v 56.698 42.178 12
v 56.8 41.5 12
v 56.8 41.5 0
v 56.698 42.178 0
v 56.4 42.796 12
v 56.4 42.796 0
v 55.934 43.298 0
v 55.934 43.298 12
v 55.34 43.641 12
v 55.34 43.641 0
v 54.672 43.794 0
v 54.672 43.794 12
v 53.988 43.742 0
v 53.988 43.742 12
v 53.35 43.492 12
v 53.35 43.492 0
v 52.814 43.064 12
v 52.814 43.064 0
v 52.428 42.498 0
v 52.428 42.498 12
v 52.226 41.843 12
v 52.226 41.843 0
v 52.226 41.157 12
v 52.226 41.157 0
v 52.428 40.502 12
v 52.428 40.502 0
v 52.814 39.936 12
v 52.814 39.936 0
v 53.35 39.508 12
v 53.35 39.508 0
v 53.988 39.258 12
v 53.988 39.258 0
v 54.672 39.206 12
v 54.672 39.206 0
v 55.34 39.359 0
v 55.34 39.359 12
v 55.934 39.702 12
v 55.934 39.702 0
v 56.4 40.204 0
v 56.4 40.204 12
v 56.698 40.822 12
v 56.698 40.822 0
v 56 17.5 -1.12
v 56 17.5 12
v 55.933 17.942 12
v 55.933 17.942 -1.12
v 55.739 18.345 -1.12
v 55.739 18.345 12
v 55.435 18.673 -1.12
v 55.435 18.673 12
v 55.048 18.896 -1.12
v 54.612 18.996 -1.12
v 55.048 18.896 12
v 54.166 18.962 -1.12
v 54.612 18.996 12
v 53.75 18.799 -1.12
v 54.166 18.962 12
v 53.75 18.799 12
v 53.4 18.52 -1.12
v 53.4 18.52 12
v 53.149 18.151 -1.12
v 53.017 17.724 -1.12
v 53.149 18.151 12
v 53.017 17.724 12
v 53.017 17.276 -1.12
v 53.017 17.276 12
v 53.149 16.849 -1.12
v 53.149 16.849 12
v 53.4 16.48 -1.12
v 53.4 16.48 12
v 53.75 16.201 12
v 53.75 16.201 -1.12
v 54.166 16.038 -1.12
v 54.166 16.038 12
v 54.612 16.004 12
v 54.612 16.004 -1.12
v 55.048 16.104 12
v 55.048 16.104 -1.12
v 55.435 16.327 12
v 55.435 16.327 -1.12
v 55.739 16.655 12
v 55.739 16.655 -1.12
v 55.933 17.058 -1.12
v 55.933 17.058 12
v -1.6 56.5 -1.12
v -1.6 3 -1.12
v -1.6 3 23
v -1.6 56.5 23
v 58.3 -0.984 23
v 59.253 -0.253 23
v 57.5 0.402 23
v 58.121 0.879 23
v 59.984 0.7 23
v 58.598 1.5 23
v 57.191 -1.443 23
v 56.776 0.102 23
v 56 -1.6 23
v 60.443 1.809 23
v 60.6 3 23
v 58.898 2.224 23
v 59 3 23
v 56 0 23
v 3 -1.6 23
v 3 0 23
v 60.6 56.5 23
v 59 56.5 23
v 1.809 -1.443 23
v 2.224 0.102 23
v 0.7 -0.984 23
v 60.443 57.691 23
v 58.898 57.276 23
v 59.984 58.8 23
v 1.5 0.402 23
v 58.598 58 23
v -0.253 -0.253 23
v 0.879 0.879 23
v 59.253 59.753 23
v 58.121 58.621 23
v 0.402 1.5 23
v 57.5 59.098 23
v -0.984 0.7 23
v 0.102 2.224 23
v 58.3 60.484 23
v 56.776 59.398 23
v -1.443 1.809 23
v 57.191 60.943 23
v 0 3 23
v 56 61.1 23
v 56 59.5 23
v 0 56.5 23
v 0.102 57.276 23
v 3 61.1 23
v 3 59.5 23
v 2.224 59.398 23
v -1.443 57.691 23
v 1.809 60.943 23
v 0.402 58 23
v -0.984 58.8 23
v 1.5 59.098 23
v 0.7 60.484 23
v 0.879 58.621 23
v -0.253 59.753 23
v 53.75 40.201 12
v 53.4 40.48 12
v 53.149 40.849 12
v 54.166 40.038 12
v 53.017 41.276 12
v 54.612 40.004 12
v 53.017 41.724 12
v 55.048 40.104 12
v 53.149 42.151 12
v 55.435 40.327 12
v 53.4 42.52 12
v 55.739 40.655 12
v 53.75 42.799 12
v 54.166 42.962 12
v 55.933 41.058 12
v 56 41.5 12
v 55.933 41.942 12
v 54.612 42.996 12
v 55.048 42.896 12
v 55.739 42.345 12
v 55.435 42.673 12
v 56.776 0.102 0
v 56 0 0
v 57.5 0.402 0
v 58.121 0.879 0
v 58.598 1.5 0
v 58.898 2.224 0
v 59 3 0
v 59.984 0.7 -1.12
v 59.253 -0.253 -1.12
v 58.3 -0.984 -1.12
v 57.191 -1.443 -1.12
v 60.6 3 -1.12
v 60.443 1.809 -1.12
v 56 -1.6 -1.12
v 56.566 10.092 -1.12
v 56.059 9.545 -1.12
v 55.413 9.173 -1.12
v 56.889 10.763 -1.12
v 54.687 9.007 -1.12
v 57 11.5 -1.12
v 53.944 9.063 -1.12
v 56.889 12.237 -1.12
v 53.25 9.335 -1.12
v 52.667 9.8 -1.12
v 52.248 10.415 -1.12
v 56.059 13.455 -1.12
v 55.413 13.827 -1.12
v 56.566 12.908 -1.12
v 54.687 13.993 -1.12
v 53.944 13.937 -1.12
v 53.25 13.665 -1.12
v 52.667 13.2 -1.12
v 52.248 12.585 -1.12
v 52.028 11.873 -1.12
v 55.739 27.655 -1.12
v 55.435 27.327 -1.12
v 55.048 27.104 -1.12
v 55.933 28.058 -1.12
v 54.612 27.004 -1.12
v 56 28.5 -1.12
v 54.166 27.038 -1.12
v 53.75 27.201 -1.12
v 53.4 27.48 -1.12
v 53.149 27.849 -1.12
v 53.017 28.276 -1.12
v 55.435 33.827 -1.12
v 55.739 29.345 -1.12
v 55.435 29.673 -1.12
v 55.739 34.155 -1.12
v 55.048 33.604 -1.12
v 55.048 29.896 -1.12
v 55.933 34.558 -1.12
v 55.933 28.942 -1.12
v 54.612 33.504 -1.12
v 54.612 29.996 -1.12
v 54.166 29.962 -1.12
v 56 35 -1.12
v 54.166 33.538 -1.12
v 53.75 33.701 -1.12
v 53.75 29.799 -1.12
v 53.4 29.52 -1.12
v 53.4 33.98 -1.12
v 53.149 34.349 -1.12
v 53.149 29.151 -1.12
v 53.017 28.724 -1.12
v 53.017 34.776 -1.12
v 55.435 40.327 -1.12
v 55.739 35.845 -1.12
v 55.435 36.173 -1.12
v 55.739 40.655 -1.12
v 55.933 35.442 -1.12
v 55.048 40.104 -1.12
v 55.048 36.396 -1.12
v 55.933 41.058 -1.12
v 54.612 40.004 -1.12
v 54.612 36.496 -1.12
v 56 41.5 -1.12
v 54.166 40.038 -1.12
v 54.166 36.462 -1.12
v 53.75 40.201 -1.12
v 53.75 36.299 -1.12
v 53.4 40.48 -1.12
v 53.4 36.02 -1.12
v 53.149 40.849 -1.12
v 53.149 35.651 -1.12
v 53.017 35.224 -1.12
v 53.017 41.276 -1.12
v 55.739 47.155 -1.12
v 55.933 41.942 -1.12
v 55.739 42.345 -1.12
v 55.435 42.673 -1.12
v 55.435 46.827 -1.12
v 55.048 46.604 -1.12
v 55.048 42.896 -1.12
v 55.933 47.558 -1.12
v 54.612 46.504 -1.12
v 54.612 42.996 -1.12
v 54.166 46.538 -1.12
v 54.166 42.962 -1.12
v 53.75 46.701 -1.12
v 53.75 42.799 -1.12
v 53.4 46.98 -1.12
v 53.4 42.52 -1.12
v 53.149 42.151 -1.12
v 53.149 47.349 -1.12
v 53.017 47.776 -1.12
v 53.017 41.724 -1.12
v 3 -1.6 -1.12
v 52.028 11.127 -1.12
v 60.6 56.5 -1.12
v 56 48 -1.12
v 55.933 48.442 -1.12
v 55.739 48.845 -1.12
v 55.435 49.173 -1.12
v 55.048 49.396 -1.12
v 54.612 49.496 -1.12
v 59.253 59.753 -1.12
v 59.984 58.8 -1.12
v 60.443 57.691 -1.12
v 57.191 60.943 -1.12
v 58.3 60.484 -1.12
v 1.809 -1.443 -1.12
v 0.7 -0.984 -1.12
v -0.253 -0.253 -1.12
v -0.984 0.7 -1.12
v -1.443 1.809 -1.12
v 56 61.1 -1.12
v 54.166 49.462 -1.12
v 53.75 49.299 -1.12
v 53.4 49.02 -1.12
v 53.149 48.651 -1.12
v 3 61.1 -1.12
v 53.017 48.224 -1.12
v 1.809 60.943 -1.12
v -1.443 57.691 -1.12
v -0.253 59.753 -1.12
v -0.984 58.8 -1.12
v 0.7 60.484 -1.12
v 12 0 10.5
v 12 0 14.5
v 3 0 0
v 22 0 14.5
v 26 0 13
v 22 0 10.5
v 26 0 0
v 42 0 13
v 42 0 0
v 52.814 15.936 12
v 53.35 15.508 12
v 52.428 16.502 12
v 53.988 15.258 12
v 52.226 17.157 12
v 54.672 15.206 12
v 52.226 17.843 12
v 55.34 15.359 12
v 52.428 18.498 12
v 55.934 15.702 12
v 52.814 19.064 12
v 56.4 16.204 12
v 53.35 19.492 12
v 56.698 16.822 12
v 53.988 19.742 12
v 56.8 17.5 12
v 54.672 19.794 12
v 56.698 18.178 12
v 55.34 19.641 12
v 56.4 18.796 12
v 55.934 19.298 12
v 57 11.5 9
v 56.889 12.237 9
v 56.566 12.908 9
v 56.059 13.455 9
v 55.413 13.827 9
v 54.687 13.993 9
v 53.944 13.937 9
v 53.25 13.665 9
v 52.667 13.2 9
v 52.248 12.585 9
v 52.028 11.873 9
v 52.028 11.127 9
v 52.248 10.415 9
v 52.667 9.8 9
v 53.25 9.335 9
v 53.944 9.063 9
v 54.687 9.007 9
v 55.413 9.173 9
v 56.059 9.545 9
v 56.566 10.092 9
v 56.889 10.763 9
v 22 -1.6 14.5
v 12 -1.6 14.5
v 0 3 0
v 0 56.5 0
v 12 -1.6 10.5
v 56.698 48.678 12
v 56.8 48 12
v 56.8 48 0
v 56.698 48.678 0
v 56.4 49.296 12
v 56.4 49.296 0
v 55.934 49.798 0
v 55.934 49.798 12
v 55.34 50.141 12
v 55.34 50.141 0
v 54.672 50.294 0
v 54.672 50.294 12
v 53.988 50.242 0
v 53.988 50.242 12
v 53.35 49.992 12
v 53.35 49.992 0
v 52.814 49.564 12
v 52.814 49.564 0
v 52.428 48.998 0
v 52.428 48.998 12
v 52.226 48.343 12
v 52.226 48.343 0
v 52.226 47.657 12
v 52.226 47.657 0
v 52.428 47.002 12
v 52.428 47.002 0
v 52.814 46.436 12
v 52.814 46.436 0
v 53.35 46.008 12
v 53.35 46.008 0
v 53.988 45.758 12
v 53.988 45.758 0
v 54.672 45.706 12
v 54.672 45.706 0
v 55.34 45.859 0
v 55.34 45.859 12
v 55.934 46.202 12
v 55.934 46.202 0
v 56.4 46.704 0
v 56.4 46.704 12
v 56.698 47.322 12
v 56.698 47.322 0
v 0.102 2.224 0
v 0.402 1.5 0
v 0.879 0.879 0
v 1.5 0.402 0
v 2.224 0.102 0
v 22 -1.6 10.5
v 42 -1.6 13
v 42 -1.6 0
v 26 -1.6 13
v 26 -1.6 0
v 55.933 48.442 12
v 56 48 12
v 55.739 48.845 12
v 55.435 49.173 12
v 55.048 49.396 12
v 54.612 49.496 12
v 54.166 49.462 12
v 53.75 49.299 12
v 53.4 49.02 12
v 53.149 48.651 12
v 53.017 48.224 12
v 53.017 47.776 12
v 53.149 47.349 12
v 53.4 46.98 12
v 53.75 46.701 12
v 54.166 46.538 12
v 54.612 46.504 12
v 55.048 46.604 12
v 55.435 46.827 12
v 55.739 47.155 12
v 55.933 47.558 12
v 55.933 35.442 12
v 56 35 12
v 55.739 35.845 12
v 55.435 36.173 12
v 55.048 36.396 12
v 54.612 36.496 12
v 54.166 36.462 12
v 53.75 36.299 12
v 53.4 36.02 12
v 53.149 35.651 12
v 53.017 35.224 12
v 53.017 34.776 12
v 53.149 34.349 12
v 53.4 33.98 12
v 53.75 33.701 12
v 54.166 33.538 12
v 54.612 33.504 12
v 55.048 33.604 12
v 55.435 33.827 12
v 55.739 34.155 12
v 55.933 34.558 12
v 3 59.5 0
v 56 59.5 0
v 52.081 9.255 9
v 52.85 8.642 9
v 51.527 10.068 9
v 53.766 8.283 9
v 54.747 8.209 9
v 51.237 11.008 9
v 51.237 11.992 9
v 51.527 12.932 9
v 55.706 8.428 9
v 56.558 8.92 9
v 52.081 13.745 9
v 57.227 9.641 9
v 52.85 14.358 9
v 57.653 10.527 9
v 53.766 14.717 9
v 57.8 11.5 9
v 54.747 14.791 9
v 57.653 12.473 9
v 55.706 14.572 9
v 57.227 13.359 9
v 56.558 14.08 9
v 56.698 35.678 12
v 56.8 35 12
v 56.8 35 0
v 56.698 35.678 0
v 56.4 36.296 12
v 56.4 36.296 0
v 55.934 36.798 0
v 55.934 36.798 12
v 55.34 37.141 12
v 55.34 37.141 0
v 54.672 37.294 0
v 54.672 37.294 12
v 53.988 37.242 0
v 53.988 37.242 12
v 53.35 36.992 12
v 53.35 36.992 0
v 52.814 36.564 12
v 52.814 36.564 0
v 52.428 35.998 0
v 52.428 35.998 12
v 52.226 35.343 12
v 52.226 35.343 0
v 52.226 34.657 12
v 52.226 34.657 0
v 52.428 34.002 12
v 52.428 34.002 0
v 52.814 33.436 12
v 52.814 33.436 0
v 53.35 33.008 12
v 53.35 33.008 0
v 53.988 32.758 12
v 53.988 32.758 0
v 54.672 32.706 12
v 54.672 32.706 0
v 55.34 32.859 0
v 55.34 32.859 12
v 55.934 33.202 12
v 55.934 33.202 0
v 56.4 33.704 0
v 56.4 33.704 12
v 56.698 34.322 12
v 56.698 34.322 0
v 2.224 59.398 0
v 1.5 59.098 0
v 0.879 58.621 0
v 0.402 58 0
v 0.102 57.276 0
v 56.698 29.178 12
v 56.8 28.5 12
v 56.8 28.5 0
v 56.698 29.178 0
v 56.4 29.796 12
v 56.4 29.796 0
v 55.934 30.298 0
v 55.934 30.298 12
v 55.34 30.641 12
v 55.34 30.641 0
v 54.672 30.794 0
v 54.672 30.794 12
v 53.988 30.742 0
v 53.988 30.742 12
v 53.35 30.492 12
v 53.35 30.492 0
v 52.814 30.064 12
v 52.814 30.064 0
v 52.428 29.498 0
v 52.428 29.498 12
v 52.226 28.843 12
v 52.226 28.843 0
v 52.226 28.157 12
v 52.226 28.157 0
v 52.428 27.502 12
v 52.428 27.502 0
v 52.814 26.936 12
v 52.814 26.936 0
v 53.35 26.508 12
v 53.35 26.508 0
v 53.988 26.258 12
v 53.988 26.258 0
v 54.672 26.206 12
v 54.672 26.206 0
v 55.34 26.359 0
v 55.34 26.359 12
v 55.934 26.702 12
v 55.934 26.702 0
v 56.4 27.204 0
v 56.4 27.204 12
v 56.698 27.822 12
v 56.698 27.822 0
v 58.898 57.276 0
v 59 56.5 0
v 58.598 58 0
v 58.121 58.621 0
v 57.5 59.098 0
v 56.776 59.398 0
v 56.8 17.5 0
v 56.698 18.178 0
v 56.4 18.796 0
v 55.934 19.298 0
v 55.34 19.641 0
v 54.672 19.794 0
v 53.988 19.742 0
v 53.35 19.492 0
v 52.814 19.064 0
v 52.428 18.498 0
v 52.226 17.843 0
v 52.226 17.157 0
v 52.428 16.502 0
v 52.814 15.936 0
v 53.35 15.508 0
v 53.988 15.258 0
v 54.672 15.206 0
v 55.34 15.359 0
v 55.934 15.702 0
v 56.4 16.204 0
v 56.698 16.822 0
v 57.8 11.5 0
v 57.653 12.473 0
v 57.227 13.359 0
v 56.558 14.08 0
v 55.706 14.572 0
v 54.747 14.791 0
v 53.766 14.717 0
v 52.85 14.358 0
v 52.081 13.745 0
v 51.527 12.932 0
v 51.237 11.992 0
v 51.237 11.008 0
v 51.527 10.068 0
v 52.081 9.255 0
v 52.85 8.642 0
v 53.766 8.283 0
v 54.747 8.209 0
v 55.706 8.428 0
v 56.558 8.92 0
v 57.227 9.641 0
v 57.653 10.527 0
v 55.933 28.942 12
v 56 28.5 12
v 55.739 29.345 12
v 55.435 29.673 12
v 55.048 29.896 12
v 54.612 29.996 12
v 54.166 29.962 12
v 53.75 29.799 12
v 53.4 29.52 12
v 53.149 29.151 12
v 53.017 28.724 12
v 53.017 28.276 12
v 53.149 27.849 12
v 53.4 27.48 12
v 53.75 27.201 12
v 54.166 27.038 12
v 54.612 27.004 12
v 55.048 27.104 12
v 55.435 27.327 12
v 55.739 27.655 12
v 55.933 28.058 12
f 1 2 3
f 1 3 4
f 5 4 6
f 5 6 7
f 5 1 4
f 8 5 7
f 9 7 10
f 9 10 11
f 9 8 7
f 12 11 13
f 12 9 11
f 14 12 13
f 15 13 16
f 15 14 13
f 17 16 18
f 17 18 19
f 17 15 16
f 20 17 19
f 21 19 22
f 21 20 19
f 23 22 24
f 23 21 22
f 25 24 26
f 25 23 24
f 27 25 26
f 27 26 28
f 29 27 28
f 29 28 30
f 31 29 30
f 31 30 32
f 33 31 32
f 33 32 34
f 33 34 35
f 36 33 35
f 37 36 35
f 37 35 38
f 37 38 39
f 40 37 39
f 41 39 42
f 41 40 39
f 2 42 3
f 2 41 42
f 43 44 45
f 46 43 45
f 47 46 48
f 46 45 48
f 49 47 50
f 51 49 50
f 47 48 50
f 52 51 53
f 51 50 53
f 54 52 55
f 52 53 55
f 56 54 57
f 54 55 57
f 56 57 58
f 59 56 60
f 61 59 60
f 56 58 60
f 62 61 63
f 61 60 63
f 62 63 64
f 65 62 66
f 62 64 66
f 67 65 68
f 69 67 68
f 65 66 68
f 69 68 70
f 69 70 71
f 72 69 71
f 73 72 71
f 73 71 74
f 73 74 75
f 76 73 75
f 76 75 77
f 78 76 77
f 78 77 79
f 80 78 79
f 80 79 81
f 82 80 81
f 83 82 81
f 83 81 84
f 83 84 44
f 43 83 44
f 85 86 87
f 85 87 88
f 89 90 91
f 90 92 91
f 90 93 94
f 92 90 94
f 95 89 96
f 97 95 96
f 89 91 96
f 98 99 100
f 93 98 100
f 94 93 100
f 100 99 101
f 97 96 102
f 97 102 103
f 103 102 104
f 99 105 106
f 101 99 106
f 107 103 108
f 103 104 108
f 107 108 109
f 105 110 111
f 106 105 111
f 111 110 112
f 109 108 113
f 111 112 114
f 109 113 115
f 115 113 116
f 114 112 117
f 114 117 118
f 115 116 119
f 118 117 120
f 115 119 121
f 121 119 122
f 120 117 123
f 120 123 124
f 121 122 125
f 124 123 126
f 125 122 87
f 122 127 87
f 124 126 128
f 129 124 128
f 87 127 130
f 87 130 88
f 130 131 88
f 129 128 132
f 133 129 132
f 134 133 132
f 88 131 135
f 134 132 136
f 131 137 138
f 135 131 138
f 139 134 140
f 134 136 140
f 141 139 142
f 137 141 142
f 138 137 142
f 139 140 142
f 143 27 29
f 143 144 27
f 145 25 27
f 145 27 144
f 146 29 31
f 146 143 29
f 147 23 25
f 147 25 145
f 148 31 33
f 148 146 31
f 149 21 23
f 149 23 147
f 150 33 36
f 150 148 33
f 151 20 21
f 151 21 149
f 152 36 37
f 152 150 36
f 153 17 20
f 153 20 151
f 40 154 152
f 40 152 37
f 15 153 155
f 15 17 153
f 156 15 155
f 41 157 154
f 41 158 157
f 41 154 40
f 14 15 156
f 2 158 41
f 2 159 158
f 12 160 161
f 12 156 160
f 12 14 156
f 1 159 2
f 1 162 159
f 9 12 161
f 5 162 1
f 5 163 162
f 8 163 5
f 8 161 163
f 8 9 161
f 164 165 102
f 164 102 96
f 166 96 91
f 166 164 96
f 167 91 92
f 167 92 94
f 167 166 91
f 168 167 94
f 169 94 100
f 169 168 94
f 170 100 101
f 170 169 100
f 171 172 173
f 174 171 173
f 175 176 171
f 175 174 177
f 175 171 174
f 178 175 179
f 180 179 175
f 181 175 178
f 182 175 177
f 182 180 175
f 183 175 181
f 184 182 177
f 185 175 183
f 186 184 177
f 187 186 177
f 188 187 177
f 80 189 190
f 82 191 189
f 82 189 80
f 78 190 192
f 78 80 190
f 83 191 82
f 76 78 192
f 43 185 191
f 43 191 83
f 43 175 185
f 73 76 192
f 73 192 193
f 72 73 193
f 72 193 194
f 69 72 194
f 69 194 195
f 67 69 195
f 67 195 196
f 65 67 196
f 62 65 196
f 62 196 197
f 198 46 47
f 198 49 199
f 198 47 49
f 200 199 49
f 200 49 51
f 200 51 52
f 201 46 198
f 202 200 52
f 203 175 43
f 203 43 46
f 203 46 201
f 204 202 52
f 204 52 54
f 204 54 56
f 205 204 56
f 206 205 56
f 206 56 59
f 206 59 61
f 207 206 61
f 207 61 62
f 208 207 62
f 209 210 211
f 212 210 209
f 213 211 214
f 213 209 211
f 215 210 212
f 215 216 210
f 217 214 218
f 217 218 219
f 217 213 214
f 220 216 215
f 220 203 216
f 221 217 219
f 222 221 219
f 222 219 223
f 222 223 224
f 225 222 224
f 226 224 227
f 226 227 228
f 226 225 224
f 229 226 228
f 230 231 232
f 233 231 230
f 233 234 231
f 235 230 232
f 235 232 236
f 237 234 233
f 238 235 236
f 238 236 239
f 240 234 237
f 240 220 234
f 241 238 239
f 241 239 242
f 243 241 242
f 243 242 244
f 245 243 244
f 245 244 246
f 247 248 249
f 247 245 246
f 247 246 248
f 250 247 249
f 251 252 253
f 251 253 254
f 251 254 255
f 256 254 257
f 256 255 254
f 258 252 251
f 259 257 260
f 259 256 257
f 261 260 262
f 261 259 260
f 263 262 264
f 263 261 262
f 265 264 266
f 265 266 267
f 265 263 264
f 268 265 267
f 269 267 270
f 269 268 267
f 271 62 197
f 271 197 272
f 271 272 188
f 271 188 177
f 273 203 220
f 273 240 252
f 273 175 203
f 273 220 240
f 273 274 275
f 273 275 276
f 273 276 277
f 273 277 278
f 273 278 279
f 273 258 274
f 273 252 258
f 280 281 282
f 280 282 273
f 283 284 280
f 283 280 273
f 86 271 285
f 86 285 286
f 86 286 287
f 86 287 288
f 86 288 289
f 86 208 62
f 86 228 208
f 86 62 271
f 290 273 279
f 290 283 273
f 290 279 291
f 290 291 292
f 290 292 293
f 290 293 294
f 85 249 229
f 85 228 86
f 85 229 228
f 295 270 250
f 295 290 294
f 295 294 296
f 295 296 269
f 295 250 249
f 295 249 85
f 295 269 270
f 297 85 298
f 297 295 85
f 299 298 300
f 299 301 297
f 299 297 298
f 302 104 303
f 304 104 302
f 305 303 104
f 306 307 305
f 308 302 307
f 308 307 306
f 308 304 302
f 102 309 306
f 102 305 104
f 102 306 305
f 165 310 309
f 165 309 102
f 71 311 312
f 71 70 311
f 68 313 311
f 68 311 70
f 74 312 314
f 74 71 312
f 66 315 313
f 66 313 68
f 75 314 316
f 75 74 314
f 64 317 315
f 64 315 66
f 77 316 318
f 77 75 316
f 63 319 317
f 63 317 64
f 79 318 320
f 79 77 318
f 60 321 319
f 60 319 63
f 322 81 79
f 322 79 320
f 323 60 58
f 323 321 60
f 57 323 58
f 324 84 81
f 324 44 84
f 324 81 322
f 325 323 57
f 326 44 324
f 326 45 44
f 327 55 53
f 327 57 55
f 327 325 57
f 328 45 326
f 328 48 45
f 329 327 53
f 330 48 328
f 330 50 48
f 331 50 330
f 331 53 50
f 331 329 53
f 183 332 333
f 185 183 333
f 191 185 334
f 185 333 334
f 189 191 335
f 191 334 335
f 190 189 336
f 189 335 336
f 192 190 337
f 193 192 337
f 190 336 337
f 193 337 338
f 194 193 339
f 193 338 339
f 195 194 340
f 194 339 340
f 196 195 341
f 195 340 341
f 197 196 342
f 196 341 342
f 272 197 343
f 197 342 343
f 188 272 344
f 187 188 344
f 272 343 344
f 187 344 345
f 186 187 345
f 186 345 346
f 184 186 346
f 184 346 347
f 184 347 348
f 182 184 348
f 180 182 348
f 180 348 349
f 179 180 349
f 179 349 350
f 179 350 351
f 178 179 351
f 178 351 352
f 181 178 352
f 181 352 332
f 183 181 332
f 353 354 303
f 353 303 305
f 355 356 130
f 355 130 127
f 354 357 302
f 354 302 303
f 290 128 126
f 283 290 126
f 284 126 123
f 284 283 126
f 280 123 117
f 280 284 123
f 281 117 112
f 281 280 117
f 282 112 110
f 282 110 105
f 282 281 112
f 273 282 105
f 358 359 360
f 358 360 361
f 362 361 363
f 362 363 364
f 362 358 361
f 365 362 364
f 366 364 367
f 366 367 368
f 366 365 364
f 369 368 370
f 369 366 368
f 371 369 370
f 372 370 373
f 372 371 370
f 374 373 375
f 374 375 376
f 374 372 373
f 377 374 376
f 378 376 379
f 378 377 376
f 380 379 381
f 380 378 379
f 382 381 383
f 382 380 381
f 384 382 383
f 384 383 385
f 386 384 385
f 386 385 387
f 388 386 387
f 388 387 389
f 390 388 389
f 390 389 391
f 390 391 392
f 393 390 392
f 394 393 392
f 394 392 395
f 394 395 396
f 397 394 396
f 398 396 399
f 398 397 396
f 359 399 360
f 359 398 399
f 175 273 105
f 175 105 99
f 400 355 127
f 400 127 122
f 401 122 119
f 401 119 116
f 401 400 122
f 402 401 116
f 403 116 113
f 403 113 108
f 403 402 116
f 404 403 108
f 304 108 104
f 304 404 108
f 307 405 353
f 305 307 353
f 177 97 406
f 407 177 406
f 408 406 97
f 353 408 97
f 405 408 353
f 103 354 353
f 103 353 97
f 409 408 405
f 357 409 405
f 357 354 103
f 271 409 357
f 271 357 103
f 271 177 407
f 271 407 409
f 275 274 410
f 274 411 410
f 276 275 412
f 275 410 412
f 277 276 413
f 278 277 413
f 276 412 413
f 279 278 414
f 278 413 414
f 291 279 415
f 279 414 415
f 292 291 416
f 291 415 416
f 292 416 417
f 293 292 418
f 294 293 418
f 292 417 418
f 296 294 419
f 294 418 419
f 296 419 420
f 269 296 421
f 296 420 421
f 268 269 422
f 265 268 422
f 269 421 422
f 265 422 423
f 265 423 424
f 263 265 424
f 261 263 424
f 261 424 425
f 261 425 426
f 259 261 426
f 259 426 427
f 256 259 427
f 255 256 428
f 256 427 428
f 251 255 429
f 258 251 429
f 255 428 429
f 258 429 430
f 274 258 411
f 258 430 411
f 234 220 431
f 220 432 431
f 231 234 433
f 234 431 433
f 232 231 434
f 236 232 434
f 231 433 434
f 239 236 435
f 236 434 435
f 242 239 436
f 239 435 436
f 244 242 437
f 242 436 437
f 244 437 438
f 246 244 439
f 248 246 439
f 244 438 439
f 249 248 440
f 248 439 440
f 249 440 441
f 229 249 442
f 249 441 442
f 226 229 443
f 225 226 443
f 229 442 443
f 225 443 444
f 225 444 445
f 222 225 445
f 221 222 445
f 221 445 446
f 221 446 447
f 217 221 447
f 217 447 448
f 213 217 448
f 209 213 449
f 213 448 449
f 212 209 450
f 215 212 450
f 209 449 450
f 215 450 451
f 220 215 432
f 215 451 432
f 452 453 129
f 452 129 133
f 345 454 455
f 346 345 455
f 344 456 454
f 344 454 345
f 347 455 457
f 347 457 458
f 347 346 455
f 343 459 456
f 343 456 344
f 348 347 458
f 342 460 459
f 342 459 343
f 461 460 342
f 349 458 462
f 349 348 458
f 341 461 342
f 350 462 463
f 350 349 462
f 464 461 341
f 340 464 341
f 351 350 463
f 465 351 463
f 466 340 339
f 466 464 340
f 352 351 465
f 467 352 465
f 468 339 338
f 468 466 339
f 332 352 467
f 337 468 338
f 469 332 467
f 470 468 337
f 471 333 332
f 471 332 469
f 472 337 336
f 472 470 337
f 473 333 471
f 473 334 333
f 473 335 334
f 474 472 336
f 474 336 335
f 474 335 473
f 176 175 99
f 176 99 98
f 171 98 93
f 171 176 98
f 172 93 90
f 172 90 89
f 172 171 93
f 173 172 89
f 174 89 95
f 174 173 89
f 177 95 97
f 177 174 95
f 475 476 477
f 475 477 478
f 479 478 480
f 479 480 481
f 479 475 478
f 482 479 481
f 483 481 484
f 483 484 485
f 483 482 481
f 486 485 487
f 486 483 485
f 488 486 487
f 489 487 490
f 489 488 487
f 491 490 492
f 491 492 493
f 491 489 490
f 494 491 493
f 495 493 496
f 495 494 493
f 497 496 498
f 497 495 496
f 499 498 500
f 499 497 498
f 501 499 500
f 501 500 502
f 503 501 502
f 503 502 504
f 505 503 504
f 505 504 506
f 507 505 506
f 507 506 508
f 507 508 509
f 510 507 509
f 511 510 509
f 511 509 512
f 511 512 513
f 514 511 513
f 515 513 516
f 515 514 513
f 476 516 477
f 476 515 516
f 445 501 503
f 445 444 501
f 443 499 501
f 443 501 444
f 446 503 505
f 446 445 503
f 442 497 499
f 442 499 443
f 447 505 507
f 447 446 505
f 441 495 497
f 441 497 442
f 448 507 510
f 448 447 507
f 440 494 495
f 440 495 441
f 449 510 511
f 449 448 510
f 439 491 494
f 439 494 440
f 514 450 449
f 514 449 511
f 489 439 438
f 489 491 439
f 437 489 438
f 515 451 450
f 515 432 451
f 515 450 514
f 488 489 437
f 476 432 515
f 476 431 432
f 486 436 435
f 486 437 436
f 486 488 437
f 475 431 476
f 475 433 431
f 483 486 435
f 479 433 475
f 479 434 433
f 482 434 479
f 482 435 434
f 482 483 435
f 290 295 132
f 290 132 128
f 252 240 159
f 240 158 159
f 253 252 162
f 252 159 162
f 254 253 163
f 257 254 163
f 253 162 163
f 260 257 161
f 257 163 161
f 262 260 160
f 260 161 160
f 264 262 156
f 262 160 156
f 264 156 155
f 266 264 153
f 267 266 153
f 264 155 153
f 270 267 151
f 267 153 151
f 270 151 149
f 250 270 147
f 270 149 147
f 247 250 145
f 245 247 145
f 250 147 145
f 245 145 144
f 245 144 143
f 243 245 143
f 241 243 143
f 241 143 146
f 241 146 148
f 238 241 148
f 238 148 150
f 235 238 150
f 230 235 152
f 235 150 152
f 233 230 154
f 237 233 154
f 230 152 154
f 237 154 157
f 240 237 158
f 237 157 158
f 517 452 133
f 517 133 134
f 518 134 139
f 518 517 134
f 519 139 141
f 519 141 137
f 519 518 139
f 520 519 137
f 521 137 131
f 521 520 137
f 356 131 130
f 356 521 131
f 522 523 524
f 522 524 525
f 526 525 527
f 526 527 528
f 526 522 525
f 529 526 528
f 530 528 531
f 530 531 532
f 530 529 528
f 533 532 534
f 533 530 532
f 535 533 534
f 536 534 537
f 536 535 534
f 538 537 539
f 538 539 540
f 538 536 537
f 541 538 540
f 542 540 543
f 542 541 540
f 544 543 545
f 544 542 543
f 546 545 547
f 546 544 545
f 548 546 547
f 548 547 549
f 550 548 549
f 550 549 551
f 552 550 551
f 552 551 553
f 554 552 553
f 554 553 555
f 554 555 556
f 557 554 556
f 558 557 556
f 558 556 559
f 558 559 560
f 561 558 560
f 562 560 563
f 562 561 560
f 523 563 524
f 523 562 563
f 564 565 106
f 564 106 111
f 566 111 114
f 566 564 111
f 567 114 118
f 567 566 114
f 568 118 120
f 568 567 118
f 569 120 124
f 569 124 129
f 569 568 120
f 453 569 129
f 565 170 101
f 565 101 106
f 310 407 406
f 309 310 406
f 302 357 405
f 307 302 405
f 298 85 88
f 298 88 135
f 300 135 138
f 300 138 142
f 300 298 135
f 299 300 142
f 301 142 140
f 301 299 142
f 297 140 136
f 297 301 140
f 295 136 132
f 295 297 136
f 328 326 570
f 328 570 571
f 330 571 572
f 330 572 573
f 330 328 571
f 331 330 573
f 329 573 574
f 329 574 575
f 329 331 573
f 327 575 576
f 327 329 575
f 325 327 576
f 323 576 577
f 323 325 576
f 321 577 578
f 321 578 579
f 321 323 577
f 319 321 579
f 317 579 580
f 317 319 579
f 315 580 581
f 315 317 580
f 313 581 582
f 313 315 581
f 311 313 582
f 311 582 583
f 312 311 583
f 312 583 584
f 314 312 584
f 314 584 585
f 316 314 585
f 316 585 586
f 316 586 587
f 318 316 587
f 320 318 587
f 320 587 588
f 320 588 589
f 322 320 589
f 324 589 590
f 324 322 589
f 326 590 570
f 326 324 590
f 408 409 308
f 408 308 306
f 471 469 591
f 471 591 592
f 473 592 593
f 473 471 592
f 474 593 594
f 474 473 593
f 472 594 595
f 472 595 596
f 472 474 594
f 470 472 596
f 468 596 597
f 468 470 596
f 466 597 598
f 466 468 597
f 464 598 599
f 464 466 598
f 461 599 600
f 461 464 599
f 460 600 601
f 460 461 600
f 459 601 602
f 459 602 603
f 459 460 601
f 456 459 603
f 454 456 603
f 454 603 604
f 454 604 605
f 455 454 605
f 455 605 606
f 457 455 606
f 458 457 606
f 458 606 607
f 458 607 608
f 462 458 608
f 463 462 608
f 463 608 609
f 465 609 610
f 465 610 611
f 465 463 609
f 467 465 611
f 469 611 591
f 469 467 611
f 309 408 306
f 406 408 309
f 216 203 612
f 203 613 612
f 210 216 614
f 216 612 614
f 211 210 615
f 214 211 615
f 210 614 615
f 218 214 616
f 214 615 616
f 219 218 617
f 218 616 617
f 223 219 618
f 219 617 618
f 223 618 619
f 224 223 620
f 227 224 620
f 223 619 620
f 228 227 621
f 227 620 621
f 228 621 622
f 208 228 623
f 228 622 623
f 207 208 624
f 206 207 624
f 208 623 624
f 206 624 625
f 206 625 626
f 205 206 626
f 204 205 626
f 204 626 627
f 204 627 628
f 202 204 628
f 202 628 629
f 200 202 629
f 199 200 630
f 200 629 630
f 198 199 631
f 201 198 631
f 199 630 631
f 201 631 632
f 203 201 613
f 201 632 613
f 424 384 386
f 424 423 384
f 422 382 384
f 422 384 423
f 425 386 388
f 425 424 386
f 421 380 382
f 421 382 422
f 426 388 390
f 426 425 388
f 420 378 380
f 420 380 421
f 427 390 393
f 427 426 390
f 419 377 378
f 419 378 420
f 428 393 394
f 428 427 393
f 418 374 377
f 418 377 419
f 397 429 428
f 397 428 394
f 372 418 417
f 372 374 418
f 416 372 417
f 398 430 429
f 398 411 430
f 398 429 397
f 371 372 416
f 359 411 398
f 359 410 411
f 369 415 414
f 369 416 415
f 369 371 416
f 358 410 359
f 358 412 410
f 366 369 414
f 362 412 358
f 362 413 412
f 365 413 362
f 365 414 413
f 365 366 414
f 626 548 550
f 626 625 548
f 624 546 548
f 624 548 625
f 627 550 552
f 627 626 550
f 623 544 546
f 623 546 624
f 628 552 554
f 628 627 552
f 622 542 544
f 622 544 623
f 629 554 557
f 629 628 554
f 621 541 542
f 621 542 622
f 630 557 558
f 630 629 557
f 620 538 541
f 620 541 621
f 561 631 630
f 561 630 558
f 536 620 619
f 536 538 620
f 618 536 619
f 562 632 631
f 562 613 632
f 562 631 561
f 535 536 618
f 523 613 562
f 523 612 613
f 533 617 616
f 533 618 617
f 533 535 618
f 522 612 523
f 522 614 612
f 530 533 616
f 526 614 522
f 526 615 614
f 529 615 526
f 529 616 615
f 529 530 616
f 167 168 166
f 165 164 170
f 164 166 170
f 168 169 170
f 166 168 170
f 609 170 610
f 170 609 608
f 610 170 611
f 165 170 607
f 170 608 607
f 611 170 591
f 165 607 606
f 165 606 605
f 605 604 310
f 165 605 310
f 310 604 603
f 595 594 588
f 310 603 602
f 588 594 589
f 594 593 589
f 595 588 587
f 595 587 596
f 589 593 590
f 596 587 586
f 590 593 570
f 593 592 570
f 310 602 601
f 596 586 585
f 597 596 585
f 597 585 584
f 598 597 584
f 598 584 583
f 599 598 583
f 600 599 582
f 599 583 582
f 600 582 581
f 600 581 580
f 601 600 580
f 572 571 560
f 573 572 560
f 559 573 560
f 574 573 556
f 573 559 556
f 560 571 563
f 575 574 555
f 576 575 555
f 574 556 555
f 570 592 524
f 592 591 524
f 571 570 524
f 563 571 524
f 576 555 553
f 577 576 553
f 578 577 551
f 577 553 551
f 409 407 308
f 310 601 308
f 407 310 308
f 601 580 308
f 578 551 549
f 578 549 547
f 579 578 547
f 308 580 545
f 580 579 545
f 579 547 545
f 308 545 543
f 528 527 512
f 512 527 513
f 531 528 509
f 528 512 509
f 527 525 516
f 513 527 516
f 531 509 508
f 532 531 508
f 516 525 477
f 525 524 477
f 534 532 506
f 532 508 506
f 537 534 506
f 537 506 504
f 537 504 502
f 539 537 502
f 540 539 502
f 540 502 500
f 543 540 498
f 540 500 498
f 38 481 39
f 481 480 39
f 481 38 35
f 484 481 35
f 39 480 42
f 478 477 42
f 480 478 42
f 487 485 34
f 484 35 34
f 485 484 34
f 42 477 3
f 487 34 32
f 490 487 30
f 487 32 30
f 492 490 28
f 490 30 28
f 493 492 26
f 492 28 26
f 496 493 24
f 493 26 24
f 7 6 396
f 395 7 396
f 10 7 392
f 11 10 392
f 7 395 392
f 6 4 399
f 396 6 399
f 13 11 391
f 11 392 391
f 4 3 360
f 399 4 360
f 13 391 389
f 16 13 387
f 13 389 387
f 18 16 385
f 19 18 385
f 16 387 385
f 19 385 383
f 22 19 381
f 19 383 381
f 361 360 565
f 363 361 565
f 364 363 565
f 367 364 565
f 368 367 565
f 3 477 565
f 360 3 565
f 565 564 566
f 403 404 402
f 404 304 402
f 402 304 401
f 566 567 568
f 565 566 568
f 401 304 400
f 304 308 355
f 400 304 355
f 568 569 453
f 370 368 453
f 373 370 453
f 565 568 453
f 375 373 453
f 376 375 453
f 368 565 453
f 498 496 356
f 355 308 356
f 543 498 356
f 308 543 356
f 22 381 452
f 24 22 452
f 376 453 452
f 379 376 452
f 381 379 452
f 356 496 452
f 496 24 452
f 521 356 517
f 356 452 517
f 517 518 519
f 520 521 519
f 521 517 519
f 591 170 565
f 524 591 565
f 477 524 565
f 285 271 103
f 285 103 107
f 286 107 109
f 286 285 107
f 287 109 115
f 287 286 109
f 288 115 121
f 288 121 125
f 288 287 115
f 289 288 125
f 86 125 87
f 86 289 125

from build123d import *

# Parameters (mm, degrees)
PARED_DEPTH             = 23
CONECTORES_REACH        = 92.181
CROQUIS2_W              = 16
CROQUIS2_H              = 13
CROQUIS2_W_2            = 10
CROQUIS2_H_2            = 4
BASE_START              = -1.12
BASE_FRENTE_DEPTH       = 1.12
LUCES_REACH             = 91.076
CROQUIS3_R              = 1.5
CROQUIS3_R_2            = 2.5
SALIENTE_EXTRUIR1_START = 12
CROQUIS3_3_R            = 2.3
CROQUIS3_3_R_2          = 1.5
SALIENTE_EXTRUIR1_DEPTH = 12
SALIENTE_EXTRUIR2_START = 9
CROQUIS3_4_R            = 3.3
CROQUIS3_4_R_2          = 2.5
SALIENTE_EXTRUIR2_DEPTH = 9


with BuildPart() as part:
    # Croquis1 → pared (new body)
    with BuildSketch(Plane.XY):
        with BuildLine():
            Line((3, 61.1), (56, 61.1))
            ThreePointArc((56, 61.1), (59.252691193, 59.752691193), (60.6, 56.5))
            Line((60.6, 56.5), (60.6, 3))
            ThreePointArc((60.6, 3), (59.252691193, -0.252691193), (56, -1.6))
            Line((56, -1.6), (3, -1.6))
            ThreePointArc((3, -1.6), (-0.252691193, -0.252691193), (-1.6, 3))
            Line((-1.6, 3), (-1.6, 56.5))
            ThreePointArc((-1.6, 56.5), (-0.252691193, 59.752691193), (3, 61.1))
        make_face()
        with BuildLine():
            Line((3, 0), (56, 0))
            ThreePointArc((56, 0), (58.121320344, 0.878679656), (59, 3))
            Line((59, 3), (59, 56.5))
            ThreePointArc((59, 56.5), (58.121320344, 58.621320344), (56, 59.5))
            Line((56, 59.5), (3, 59.5))
            ThreePointArc((3, 59.5), (0.878679656, 58.621320344), (0, 56.5))
            Line((0, 56.5), (0, 3))
            ThreePointArc((0, 3), (0.878679656, 0.878679656), (3, 0))
        make_face(mode=Mode.SUBTRACT)
    extrude(amount=PARED_DEPTH)

    # Croquis2 → conectores (cut, up to next)
    with BuildSketch(Plane.XZ.offset(1.6), mode=Mode.PRIVATE) as conectores_sk1:
        with Locations((34, 6.5)):
            Rectangle(CROQUIS2_W, CROQUIS2_H)
    conectores_tool1 = extrude(conectores_sk1.sketch, amount=-CONECTORES_REACH, mode=Mode.PRIVATE) & part.part
    # Croquis2 → conectores (cut, up to next)
    with BuildSketch(Plane.XZ.offset(1.6), mode=Mode.PRIVATE) as conectores_sk2:
        with Locations((17, 12.5)):
            Rectangle(CROQUIS2_W_2, CROQUIS2_H_2)
    conectores_tool2 = extrude(conectores_sk2.sketch, amount=-CONECTORES_REACH, mode=Mode.PRIVATE) & part.part
    add(conectores_tool1.solids().sort_by_distance((34, -1.6, 6.5))[0], mode=Mode.SUBTRACT)
    add(conectores_tool2.solids().sort_by_distance((17, -1.6, 12.5))[0], mode=Mode.SUBTRACT)

    # Croquis1<2> → base frente (add)
    with BuildSketch(Plane.XY.offset(BASE_START)):
        with BuildLine():
            Line((3, 61.1), (56, 61.1))
            ThreePointArc((56, 61.1), (59.252691193, 59.752691193), (60.6, 56.5))
            Line((60.6, 56.5), (60.6, 3))
            ThreePointArc((60.6, 3), (59.252691193, -0.252691193), (56, -1.6))
            Line((56, -1.6), (3, -1.6))
            ThreePointArc((3, -1.6), (-0.252691193, -0.252691193), (-1.6, 3))
            Line((-1.6, 3), (-1.6, 56.5))
            ThreePointArc((-1.6, 56.5), (-0.252691193, 59.752691193), (3, 61.1))
        make_face()
    extrude(amount=BASE_FRENTE_DEPTH)

    # Croquis3 → luces (cut, up to next)
    with BuildSketch(Plane.XY, mode=Mode.PRIVATE) as luces_sk1:
        with Locations((54.5, 48)):
            Circle(CROQUIS3_R)
    luces_tool1 = extrude(luces_sk1.sketch, amount=-LUCES_REACH, mode=Mode.PRIVATE) & part.part
    # Croquis3 → luces (cut, up to next)
    with BuildSketch(Plane.XY, mode=Mode.PRIVATE) as luces_sk2:
        with Locations((54.5, 41.5)):
            Circle(CROQUIS3_R)
    luces_tool2 = extrude(luces_sk2.sketch, amount=-LUCES_REACH, mode=Mode.PRIVATE) & part.part
    # Croquis3 → luces (cut, up to next)
    with BuildSketch(Plane.XY, mode=Mode.PRIVATE) as luces_sk3:
        with Locations((54.5, 35)):
            Circle(CROQUIS3_R)
    luces_tool3 = extrude(luces_sk3.sketch, amount=-LUCES_REACH, mode=Mode.PRIVATE) & part.part
    # Croquis3 → luces (cut, up to next)
    with BuildSketch(Plane.XY, mode=Mode.PRIVATE) as luces_sk4:
        with Locations((54.5, 28.5)):
            Circle(CROQUIS3_R)
    luces_tool4 = extrude(luces_sk4.sketch, amount=-LUCES_REACH, mode=Mode.PRIVATE) & part.part
    # Croquis3 → luces (cut, up to next)
    with BuildSketch(Plane.XY, mode=Mode.PRIVATE) as luces_sk5:
        with Locations((54.5, 17.5)):
            Circle(CROQUIS3_R)
    luces_tool5 = extrude(luces_sk5.sketch, amount=-LUCES_REACH, mode=Mode.PRIVATE) & part.part
    # Croquis3 → luces (cut, up to next)
    with BuildSketch(Plane.XY, mode=Mode.PRIVATE) as luces_sk6:
        with Locations((54.5, 11.5)):
            Circle(CROQUIS3_R_2)
    luces_tool6 = extrude(luces_sk6.sketch, amount=-LUCES_REACH, mode=Mode.PRIVATE) & part.part
    add(luces_tool1.solids().sort_by_distance((54.5, 48, 0))[0], mode=Mode.SUBTRACT)
    add(luces_tool2.solids().sort_by_distance((54.5, 41.5, 0))[0], mode=Mode.SUBTRACT)
    add(luces_tool3.solids().sort_by_distance((54.5, 35, 0))[0], mode=Mode.SUBTRACT)
    add(luces_tool4.solids().sort_by_distance((54.5, 28.5, 0))[0], mode=Mode.SUBTRACT)
    add(luces_tool5.solids().sort_by_distance((54.5, 17.5, 0))[0], mode=Mode.SUBTRACT)
    add(luces_tool6.solids().sort_by_distance((54.5, 11.5, 0))[0], mode=Mode.SUBTRACT)

    # Croquis3<3> → Saliente-Extruir1 (add)
    # profile 1 of 5: a face of its own
    with BuildSketch(Plane.XY.offset(SALIENTE_EXTRUIR1_START)):
        with Locations((54.5, 17.5)):
            Circle(CROQUIS3_3_R)
        with Locations((54.5, 17.5)):
            Circle(CROQUIS3_3_R_2, mode=Mode.SUBTRACT)
    # profile 2 of 5: a face of its own
    with BuildSketch(Plane.XY.offset(SALIENTE_EXTRUIR1_START)):
        with Locations((54.5, 28.5)):
            Circle(CROQUIS3_3_R)
        with Locations((54.5, 28.5)):
            Circle(CROQUIS3_3_R_2, mode=Mode.SUBTRACT)
    # profile 3 of 5: a face of its own
    with BuildSketch(Plane.XY.offset(SALIENTE_EXTRUIR1_START)):
        with Locations((54.5, 35)):
            Circle(CROQUIS3_3_R)
        with Locations((54.5, 35)):
            Circle(CROQUIS3_3_R_2, mode=Mode.SUBTRACT)
    # profile 4 of 5: a face of its own
    with BuildSketch(Plane.XY.offset(SALIENTE_EXTRUIR1_START)):
        with Locations((54.5, 41.5)):
            Circle(CROQUIS3_3_R)
        with Locations((54.5, 41.5)):
            Circle(CROQUIS3_3_R_2, mode=Mode.SUBTRACT)
    # profile 5 of 5: a face of its own
    with BuildSketch(Plane.XY.offset(SALIENTE_EXTRUIR1_START)):
        with Locations((54.5, 48)):
            Circle(CROQUIS3_3_R)
        with Locations((54.5, 48)):
            Circle(CROQUIS3_3_R_2, mode=Mode.SUBTRACT)
    extrude(amount=-SALIENTE_EXTRUIR1_DEPTH)

    # Croquis3<4> → Saliente-Extruir2 (add)
    with BuildSketch(Plane.XY.offset(SALIENTE_EXTRUIR2_START)):
        with Locations((54.5, 11.5)):
            Circle(CROQUIS3_4_R)
        with Locations((54.5, 11.5)):
            Circle(CROQUIS3_4_R_2, mode=Mode.SUBTRACT)
    extrude(amount=-SALIENTE_EXTRUIR2_DEPTH)


solid = part.part
